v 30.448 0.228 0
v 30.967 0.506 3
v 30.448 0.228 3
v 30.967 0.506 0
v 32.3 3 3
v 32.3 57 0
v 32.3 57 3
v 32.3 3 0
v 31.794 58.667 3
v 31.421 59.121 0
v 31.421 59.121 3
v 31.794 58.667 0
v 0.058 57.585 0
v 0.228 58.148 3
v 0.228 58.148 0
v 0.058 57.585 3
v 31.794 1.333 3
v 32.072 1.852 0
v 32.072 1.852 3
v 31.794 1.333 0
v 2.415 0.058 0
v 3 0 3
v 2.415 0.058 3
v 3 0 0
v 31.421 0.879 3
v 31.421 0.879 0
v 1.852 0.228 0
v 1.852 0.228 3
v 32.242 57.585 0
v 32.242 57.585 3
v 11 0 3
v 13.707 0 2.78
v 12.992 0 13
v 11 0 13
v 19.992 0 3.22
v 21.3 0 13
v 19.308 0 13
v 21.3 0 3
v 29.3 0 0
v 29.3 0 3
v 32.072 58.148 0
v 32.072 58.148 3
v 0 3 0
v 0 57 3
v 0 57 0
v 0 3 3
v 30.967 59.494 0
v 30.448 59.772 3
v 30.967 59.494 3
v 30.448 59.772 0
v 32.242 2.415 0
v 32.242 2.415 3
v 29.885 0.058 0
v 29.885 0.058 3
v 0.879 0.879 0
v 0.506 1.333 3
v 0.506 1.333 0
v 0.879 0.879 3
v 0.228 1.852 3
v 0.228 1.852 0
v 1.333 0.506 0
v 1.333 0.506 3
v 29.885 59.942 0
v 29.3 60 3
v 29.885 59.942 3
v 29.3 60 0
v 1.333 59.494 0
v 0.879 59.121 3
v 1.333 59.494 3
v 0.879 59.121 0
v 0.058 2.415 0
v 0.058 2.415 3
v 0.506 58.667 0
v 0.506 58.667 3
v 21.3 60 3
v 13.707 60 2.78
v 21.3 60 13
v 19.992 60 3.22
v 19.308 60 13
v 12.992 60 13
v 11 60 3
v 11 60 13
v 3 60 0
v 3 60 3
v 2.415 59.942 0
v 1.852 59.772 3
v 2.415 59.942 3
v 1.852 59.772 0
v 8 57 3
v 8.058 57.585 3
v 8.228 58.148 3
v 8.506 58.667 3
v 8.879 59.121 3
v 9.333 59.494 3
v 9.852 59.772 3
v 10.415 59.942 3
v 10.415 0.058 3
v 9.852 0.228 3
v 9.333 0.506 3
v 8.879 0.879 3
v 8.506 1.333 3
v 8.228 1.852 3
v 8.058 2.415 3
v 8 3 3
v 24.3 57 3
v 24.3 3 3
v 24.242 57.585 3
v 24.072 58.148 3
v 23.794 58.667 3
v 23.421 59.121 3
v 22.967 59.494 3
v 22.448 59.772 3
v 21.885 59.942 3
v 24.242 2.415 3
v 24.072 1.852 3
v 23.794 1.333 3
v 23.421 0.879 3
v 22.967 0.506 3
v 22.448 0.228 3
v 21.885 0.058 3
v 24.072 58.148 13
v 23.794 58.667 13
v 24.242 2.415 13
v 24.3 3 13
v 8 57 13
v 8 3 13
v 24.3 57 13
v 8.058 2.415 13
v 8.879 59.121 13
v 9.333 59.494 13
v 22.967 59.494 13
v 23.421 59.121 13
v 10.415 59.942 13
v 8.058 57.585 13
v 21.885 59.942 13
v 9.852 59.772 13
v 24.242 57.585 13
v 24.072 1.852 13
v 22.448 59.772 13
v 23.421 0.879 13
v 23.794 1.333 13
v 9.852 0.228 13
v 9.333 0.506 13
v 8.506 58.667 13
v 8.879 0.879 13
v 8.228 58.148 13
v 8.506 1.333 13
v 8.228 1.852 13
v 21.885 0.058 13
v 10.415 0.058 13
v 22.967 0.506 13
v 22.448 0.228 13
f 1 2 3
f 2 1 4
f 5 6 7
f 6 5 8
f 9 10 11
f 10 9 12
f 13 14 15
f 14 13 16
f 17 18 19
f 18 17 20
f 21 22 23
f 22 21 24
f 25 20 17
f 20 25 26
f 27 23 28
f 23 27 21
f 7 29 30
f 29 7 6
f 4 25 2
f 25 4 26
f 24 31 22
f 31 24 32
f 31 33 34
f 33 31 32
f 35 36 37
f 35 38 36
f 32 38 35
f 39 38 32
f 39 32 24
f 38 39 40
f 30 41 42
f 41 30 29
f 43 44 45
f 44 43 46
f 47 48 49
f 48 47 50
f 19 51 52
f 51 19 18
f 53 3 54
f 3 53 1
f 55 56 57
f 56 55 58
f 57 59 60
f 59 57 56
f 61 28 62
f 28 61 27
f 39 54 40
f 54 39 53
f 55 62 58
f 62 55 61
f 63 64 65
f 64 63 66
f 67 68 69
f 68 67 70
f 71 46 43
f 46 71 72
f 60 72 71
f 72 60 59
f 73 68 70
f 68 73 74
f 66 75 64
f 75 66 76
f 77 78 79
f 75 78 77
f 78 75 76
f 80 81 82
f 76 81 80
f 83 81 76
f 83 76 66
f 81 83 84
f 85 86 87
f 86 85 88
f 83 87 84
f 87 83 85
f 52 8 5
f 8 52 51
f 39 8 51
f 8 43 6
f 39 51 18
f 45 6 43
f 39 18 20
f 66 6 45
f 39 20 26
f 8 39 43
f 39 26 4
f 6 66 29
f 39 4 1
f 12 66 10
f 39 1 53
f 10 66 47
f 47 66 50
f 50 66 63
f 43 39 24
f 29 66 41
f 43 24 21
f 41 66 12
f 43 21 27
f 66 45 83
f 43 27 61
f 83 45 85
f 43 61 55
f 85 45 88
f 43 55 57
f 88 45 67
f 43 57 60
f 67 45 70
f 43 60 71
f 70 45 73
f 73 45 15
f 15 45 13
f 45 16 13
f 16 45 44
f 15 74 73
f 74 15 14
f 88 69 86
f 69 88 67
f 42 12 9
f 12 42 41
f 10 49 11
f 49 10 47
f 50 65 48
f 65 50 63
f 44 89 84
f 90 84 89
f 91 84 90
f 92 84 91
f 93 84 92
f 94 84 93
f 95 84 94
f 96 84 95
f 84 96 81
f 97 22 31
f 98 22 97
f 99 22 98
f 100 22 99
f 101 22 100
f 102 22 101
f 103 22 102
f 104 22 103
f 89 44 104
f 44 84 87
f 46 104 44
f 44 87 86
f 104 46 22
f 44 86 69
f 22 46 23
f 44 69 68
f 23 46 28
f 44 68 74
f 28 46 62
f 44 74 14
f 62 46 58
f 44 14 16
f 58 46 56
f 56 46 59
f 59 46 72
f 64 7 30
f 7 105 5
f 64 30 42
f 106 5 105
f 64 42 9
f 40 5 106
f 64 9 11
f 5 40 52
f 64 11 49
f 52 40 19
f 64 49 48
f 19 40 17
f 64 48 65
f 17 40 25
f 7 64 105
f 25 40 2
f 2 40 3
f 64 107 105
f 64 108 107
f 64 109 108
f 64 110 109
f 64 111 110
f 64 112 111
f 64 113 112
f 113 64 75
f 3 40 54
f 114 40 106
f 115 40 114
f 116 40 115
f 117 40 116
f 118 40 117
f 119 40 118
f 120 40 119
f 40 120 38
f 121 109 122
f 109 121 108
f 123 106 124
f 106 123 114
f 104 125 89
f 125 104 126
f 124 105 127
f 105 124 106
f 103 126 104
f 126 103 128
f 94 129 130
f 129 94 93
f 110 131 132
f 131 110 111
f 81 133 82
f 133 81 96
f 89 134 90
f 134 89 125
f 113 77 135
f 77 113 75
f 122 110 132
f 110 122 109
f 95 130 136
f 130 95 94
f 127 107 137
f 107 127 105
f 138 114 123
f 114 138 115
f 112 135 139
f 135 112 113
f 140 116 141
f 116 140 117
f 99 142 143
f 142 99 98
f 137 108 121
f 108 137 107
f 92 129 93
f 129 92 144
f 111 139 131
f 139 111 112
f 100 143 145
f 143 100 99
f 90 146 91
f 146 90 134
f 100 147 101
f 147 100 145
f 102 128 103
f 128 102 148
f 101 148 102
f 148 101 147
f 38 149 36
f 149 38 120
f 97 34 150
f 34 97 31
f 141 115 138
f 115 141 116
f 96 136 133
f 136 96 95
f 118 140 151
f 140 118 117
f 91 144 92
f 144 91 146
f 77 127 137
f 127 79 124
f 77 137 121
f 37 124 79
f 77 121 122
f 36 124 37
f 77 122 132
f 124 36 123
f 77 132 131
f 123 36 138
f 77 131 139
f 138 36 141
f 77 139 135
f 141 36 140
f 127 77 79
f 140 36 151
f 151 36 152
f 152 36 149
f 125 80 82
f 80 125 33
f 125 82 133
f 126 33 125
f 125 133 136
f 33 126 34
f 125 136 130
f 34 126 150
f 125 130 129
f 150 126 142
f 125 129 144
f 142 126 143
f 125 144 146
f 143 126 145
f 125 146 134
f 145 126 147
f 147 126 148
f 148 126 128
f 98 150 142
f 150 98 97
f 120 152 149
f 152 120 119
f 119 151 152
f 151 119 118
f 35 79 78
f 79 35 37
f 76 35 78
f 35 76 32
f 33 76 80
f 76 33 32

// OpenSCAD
// ===================================================================
// Leaning mirror stand
//
// Holds a rectangular mirror (with a 5mm-thick plastic base edge) in
// a blind slot cut into a solid base block. The slot is tilted so the
// mirror leans forward at lean_angle from horizontal instead of
// standing perfectly vertical (90 deg).
//
// Axes: X = front/back (depth, X=0 is the front edge, +X is toward
//       the back), Y = left/right (stand_width), Z = up (Z=0 at the
//       bottom of the base).
//
// Stability: leaning the mirror forward shifts its weight toward the
// front edge of the stand, so the base apron in front of the slot is
// made larger than the apron behind it. front_apron/back_apron below
// are a starting guess — widen front_apron (or add mass/weight to the
// base) if the actual mirror is tall/heavy enough to still tip.
// ===================================================================

/* [Mirror] */
mirror_base_depth = 6;   // front-to-back thickness of the mirror's plastic base

/* [Lean] */
lean_angle = 86;          // desired angle of the mirror from horizontal (90 = vertical)
// Negative so the slot leans the mirror toward the front (X=0) edge,
// per the rotate([0, tilt, 0]) convention used in slot_cutter().
tilt = -(90 - lean_angle);

/* [Slot] */
eps = 0.3;                          // clearance so the mirror base slides in freely
slot_gap   = mirror_base_depth + eps; // front-to-back width of the slot
slot_depth = 10;                    // vertical depth of the (blind) slot

/* [Base] */
// Base is a thin flat plate across the whole footprint (for a low,
// low-profile look and a wide stable footprint), with a raised boss
// only around the slot, tall enough to hold the full slot depth.
stand_width     = 60;   // Y: overall width of the stand (and the slot)
front_apron     = 13;   // X: plate material in front of the slot
back_apron      = 13;   // X: plate material behind the slot
plate_thickness = 3;    // Z: thickness of the flat plate away from the boss
floor_thickness = 3;    // solid material below the slot floor (within the boss)
boss_margin     = 5;    // X: extra boss material in front of and behind the slot
base_depth = front_apron + slot_gap + back_apron; // X: total footprint depth
boss_height = slot_depth + floor_thickness; // Z: total height at the boss, from Z=0
boss_depth  = slot_gap + 2 * boss_margin;   // X: footprint of the raised boss
slot_x = front_apron + slot_gap / 2; // X: center of the slot

/* [Corners] */
plate_corner_radius = 3;  // rounding radius of the plate's footprint corners
boss_corner_radius  = 3;  // rounding radius of the boss's footprint corners
corner_fn = 32;           // smoothness of the rounded corners

// A box with its footprint (XY) corners rounded, straight from Z=0 to h.
// r must be <= half of both x and y, or the corner cylinders overlap and
// the box silently renders wider/deeper than [x, y].
module rounded_box(x, y, h, r) {
    assert(r <= min(x, y) / 2, "rounded_box: corner radius too large for box footprint");
    hull() {
        for (i = [r, x - r], j = [r, y - r])
            translate([i, j, 0])
                cylinder(r = r, h = h, $fn = corner_fn);
    }
}

module plate() {
    rounded_box(base_depth, stand_width, plate_thickness, plate_corner_radius);
}

module boss() {
    translate([slot_x - boss_depth / 2, 0, 0])
        rounded_box(boss_depth, stand_width, boss_height, boss_corner_radius);
}

module slot_cutter() {
    overcut   = 4;  // extra length so the cutter fully clears both sides of the stand
    top_pad   = 2;  // extra length so the cutter pokes above the top face for a clean cut
    cutter_len = slot_depth / cos(tilt) + top_pad;

    // pivot: center of the slot at the top of the boss
    translate([slot_x, stand_width / 2, boss_height])
        rotate([0, tilt, 0])
            translate([-slot_gap / 2, -stand_width / 2 - overcut / 2, top_pad - cutter_len])
                cube([slot_gap, stand_width + overcut, cutter_len]);
}

difference() {
    union() {
        plate();
        boss();
    }
    slot_cutter();
}
